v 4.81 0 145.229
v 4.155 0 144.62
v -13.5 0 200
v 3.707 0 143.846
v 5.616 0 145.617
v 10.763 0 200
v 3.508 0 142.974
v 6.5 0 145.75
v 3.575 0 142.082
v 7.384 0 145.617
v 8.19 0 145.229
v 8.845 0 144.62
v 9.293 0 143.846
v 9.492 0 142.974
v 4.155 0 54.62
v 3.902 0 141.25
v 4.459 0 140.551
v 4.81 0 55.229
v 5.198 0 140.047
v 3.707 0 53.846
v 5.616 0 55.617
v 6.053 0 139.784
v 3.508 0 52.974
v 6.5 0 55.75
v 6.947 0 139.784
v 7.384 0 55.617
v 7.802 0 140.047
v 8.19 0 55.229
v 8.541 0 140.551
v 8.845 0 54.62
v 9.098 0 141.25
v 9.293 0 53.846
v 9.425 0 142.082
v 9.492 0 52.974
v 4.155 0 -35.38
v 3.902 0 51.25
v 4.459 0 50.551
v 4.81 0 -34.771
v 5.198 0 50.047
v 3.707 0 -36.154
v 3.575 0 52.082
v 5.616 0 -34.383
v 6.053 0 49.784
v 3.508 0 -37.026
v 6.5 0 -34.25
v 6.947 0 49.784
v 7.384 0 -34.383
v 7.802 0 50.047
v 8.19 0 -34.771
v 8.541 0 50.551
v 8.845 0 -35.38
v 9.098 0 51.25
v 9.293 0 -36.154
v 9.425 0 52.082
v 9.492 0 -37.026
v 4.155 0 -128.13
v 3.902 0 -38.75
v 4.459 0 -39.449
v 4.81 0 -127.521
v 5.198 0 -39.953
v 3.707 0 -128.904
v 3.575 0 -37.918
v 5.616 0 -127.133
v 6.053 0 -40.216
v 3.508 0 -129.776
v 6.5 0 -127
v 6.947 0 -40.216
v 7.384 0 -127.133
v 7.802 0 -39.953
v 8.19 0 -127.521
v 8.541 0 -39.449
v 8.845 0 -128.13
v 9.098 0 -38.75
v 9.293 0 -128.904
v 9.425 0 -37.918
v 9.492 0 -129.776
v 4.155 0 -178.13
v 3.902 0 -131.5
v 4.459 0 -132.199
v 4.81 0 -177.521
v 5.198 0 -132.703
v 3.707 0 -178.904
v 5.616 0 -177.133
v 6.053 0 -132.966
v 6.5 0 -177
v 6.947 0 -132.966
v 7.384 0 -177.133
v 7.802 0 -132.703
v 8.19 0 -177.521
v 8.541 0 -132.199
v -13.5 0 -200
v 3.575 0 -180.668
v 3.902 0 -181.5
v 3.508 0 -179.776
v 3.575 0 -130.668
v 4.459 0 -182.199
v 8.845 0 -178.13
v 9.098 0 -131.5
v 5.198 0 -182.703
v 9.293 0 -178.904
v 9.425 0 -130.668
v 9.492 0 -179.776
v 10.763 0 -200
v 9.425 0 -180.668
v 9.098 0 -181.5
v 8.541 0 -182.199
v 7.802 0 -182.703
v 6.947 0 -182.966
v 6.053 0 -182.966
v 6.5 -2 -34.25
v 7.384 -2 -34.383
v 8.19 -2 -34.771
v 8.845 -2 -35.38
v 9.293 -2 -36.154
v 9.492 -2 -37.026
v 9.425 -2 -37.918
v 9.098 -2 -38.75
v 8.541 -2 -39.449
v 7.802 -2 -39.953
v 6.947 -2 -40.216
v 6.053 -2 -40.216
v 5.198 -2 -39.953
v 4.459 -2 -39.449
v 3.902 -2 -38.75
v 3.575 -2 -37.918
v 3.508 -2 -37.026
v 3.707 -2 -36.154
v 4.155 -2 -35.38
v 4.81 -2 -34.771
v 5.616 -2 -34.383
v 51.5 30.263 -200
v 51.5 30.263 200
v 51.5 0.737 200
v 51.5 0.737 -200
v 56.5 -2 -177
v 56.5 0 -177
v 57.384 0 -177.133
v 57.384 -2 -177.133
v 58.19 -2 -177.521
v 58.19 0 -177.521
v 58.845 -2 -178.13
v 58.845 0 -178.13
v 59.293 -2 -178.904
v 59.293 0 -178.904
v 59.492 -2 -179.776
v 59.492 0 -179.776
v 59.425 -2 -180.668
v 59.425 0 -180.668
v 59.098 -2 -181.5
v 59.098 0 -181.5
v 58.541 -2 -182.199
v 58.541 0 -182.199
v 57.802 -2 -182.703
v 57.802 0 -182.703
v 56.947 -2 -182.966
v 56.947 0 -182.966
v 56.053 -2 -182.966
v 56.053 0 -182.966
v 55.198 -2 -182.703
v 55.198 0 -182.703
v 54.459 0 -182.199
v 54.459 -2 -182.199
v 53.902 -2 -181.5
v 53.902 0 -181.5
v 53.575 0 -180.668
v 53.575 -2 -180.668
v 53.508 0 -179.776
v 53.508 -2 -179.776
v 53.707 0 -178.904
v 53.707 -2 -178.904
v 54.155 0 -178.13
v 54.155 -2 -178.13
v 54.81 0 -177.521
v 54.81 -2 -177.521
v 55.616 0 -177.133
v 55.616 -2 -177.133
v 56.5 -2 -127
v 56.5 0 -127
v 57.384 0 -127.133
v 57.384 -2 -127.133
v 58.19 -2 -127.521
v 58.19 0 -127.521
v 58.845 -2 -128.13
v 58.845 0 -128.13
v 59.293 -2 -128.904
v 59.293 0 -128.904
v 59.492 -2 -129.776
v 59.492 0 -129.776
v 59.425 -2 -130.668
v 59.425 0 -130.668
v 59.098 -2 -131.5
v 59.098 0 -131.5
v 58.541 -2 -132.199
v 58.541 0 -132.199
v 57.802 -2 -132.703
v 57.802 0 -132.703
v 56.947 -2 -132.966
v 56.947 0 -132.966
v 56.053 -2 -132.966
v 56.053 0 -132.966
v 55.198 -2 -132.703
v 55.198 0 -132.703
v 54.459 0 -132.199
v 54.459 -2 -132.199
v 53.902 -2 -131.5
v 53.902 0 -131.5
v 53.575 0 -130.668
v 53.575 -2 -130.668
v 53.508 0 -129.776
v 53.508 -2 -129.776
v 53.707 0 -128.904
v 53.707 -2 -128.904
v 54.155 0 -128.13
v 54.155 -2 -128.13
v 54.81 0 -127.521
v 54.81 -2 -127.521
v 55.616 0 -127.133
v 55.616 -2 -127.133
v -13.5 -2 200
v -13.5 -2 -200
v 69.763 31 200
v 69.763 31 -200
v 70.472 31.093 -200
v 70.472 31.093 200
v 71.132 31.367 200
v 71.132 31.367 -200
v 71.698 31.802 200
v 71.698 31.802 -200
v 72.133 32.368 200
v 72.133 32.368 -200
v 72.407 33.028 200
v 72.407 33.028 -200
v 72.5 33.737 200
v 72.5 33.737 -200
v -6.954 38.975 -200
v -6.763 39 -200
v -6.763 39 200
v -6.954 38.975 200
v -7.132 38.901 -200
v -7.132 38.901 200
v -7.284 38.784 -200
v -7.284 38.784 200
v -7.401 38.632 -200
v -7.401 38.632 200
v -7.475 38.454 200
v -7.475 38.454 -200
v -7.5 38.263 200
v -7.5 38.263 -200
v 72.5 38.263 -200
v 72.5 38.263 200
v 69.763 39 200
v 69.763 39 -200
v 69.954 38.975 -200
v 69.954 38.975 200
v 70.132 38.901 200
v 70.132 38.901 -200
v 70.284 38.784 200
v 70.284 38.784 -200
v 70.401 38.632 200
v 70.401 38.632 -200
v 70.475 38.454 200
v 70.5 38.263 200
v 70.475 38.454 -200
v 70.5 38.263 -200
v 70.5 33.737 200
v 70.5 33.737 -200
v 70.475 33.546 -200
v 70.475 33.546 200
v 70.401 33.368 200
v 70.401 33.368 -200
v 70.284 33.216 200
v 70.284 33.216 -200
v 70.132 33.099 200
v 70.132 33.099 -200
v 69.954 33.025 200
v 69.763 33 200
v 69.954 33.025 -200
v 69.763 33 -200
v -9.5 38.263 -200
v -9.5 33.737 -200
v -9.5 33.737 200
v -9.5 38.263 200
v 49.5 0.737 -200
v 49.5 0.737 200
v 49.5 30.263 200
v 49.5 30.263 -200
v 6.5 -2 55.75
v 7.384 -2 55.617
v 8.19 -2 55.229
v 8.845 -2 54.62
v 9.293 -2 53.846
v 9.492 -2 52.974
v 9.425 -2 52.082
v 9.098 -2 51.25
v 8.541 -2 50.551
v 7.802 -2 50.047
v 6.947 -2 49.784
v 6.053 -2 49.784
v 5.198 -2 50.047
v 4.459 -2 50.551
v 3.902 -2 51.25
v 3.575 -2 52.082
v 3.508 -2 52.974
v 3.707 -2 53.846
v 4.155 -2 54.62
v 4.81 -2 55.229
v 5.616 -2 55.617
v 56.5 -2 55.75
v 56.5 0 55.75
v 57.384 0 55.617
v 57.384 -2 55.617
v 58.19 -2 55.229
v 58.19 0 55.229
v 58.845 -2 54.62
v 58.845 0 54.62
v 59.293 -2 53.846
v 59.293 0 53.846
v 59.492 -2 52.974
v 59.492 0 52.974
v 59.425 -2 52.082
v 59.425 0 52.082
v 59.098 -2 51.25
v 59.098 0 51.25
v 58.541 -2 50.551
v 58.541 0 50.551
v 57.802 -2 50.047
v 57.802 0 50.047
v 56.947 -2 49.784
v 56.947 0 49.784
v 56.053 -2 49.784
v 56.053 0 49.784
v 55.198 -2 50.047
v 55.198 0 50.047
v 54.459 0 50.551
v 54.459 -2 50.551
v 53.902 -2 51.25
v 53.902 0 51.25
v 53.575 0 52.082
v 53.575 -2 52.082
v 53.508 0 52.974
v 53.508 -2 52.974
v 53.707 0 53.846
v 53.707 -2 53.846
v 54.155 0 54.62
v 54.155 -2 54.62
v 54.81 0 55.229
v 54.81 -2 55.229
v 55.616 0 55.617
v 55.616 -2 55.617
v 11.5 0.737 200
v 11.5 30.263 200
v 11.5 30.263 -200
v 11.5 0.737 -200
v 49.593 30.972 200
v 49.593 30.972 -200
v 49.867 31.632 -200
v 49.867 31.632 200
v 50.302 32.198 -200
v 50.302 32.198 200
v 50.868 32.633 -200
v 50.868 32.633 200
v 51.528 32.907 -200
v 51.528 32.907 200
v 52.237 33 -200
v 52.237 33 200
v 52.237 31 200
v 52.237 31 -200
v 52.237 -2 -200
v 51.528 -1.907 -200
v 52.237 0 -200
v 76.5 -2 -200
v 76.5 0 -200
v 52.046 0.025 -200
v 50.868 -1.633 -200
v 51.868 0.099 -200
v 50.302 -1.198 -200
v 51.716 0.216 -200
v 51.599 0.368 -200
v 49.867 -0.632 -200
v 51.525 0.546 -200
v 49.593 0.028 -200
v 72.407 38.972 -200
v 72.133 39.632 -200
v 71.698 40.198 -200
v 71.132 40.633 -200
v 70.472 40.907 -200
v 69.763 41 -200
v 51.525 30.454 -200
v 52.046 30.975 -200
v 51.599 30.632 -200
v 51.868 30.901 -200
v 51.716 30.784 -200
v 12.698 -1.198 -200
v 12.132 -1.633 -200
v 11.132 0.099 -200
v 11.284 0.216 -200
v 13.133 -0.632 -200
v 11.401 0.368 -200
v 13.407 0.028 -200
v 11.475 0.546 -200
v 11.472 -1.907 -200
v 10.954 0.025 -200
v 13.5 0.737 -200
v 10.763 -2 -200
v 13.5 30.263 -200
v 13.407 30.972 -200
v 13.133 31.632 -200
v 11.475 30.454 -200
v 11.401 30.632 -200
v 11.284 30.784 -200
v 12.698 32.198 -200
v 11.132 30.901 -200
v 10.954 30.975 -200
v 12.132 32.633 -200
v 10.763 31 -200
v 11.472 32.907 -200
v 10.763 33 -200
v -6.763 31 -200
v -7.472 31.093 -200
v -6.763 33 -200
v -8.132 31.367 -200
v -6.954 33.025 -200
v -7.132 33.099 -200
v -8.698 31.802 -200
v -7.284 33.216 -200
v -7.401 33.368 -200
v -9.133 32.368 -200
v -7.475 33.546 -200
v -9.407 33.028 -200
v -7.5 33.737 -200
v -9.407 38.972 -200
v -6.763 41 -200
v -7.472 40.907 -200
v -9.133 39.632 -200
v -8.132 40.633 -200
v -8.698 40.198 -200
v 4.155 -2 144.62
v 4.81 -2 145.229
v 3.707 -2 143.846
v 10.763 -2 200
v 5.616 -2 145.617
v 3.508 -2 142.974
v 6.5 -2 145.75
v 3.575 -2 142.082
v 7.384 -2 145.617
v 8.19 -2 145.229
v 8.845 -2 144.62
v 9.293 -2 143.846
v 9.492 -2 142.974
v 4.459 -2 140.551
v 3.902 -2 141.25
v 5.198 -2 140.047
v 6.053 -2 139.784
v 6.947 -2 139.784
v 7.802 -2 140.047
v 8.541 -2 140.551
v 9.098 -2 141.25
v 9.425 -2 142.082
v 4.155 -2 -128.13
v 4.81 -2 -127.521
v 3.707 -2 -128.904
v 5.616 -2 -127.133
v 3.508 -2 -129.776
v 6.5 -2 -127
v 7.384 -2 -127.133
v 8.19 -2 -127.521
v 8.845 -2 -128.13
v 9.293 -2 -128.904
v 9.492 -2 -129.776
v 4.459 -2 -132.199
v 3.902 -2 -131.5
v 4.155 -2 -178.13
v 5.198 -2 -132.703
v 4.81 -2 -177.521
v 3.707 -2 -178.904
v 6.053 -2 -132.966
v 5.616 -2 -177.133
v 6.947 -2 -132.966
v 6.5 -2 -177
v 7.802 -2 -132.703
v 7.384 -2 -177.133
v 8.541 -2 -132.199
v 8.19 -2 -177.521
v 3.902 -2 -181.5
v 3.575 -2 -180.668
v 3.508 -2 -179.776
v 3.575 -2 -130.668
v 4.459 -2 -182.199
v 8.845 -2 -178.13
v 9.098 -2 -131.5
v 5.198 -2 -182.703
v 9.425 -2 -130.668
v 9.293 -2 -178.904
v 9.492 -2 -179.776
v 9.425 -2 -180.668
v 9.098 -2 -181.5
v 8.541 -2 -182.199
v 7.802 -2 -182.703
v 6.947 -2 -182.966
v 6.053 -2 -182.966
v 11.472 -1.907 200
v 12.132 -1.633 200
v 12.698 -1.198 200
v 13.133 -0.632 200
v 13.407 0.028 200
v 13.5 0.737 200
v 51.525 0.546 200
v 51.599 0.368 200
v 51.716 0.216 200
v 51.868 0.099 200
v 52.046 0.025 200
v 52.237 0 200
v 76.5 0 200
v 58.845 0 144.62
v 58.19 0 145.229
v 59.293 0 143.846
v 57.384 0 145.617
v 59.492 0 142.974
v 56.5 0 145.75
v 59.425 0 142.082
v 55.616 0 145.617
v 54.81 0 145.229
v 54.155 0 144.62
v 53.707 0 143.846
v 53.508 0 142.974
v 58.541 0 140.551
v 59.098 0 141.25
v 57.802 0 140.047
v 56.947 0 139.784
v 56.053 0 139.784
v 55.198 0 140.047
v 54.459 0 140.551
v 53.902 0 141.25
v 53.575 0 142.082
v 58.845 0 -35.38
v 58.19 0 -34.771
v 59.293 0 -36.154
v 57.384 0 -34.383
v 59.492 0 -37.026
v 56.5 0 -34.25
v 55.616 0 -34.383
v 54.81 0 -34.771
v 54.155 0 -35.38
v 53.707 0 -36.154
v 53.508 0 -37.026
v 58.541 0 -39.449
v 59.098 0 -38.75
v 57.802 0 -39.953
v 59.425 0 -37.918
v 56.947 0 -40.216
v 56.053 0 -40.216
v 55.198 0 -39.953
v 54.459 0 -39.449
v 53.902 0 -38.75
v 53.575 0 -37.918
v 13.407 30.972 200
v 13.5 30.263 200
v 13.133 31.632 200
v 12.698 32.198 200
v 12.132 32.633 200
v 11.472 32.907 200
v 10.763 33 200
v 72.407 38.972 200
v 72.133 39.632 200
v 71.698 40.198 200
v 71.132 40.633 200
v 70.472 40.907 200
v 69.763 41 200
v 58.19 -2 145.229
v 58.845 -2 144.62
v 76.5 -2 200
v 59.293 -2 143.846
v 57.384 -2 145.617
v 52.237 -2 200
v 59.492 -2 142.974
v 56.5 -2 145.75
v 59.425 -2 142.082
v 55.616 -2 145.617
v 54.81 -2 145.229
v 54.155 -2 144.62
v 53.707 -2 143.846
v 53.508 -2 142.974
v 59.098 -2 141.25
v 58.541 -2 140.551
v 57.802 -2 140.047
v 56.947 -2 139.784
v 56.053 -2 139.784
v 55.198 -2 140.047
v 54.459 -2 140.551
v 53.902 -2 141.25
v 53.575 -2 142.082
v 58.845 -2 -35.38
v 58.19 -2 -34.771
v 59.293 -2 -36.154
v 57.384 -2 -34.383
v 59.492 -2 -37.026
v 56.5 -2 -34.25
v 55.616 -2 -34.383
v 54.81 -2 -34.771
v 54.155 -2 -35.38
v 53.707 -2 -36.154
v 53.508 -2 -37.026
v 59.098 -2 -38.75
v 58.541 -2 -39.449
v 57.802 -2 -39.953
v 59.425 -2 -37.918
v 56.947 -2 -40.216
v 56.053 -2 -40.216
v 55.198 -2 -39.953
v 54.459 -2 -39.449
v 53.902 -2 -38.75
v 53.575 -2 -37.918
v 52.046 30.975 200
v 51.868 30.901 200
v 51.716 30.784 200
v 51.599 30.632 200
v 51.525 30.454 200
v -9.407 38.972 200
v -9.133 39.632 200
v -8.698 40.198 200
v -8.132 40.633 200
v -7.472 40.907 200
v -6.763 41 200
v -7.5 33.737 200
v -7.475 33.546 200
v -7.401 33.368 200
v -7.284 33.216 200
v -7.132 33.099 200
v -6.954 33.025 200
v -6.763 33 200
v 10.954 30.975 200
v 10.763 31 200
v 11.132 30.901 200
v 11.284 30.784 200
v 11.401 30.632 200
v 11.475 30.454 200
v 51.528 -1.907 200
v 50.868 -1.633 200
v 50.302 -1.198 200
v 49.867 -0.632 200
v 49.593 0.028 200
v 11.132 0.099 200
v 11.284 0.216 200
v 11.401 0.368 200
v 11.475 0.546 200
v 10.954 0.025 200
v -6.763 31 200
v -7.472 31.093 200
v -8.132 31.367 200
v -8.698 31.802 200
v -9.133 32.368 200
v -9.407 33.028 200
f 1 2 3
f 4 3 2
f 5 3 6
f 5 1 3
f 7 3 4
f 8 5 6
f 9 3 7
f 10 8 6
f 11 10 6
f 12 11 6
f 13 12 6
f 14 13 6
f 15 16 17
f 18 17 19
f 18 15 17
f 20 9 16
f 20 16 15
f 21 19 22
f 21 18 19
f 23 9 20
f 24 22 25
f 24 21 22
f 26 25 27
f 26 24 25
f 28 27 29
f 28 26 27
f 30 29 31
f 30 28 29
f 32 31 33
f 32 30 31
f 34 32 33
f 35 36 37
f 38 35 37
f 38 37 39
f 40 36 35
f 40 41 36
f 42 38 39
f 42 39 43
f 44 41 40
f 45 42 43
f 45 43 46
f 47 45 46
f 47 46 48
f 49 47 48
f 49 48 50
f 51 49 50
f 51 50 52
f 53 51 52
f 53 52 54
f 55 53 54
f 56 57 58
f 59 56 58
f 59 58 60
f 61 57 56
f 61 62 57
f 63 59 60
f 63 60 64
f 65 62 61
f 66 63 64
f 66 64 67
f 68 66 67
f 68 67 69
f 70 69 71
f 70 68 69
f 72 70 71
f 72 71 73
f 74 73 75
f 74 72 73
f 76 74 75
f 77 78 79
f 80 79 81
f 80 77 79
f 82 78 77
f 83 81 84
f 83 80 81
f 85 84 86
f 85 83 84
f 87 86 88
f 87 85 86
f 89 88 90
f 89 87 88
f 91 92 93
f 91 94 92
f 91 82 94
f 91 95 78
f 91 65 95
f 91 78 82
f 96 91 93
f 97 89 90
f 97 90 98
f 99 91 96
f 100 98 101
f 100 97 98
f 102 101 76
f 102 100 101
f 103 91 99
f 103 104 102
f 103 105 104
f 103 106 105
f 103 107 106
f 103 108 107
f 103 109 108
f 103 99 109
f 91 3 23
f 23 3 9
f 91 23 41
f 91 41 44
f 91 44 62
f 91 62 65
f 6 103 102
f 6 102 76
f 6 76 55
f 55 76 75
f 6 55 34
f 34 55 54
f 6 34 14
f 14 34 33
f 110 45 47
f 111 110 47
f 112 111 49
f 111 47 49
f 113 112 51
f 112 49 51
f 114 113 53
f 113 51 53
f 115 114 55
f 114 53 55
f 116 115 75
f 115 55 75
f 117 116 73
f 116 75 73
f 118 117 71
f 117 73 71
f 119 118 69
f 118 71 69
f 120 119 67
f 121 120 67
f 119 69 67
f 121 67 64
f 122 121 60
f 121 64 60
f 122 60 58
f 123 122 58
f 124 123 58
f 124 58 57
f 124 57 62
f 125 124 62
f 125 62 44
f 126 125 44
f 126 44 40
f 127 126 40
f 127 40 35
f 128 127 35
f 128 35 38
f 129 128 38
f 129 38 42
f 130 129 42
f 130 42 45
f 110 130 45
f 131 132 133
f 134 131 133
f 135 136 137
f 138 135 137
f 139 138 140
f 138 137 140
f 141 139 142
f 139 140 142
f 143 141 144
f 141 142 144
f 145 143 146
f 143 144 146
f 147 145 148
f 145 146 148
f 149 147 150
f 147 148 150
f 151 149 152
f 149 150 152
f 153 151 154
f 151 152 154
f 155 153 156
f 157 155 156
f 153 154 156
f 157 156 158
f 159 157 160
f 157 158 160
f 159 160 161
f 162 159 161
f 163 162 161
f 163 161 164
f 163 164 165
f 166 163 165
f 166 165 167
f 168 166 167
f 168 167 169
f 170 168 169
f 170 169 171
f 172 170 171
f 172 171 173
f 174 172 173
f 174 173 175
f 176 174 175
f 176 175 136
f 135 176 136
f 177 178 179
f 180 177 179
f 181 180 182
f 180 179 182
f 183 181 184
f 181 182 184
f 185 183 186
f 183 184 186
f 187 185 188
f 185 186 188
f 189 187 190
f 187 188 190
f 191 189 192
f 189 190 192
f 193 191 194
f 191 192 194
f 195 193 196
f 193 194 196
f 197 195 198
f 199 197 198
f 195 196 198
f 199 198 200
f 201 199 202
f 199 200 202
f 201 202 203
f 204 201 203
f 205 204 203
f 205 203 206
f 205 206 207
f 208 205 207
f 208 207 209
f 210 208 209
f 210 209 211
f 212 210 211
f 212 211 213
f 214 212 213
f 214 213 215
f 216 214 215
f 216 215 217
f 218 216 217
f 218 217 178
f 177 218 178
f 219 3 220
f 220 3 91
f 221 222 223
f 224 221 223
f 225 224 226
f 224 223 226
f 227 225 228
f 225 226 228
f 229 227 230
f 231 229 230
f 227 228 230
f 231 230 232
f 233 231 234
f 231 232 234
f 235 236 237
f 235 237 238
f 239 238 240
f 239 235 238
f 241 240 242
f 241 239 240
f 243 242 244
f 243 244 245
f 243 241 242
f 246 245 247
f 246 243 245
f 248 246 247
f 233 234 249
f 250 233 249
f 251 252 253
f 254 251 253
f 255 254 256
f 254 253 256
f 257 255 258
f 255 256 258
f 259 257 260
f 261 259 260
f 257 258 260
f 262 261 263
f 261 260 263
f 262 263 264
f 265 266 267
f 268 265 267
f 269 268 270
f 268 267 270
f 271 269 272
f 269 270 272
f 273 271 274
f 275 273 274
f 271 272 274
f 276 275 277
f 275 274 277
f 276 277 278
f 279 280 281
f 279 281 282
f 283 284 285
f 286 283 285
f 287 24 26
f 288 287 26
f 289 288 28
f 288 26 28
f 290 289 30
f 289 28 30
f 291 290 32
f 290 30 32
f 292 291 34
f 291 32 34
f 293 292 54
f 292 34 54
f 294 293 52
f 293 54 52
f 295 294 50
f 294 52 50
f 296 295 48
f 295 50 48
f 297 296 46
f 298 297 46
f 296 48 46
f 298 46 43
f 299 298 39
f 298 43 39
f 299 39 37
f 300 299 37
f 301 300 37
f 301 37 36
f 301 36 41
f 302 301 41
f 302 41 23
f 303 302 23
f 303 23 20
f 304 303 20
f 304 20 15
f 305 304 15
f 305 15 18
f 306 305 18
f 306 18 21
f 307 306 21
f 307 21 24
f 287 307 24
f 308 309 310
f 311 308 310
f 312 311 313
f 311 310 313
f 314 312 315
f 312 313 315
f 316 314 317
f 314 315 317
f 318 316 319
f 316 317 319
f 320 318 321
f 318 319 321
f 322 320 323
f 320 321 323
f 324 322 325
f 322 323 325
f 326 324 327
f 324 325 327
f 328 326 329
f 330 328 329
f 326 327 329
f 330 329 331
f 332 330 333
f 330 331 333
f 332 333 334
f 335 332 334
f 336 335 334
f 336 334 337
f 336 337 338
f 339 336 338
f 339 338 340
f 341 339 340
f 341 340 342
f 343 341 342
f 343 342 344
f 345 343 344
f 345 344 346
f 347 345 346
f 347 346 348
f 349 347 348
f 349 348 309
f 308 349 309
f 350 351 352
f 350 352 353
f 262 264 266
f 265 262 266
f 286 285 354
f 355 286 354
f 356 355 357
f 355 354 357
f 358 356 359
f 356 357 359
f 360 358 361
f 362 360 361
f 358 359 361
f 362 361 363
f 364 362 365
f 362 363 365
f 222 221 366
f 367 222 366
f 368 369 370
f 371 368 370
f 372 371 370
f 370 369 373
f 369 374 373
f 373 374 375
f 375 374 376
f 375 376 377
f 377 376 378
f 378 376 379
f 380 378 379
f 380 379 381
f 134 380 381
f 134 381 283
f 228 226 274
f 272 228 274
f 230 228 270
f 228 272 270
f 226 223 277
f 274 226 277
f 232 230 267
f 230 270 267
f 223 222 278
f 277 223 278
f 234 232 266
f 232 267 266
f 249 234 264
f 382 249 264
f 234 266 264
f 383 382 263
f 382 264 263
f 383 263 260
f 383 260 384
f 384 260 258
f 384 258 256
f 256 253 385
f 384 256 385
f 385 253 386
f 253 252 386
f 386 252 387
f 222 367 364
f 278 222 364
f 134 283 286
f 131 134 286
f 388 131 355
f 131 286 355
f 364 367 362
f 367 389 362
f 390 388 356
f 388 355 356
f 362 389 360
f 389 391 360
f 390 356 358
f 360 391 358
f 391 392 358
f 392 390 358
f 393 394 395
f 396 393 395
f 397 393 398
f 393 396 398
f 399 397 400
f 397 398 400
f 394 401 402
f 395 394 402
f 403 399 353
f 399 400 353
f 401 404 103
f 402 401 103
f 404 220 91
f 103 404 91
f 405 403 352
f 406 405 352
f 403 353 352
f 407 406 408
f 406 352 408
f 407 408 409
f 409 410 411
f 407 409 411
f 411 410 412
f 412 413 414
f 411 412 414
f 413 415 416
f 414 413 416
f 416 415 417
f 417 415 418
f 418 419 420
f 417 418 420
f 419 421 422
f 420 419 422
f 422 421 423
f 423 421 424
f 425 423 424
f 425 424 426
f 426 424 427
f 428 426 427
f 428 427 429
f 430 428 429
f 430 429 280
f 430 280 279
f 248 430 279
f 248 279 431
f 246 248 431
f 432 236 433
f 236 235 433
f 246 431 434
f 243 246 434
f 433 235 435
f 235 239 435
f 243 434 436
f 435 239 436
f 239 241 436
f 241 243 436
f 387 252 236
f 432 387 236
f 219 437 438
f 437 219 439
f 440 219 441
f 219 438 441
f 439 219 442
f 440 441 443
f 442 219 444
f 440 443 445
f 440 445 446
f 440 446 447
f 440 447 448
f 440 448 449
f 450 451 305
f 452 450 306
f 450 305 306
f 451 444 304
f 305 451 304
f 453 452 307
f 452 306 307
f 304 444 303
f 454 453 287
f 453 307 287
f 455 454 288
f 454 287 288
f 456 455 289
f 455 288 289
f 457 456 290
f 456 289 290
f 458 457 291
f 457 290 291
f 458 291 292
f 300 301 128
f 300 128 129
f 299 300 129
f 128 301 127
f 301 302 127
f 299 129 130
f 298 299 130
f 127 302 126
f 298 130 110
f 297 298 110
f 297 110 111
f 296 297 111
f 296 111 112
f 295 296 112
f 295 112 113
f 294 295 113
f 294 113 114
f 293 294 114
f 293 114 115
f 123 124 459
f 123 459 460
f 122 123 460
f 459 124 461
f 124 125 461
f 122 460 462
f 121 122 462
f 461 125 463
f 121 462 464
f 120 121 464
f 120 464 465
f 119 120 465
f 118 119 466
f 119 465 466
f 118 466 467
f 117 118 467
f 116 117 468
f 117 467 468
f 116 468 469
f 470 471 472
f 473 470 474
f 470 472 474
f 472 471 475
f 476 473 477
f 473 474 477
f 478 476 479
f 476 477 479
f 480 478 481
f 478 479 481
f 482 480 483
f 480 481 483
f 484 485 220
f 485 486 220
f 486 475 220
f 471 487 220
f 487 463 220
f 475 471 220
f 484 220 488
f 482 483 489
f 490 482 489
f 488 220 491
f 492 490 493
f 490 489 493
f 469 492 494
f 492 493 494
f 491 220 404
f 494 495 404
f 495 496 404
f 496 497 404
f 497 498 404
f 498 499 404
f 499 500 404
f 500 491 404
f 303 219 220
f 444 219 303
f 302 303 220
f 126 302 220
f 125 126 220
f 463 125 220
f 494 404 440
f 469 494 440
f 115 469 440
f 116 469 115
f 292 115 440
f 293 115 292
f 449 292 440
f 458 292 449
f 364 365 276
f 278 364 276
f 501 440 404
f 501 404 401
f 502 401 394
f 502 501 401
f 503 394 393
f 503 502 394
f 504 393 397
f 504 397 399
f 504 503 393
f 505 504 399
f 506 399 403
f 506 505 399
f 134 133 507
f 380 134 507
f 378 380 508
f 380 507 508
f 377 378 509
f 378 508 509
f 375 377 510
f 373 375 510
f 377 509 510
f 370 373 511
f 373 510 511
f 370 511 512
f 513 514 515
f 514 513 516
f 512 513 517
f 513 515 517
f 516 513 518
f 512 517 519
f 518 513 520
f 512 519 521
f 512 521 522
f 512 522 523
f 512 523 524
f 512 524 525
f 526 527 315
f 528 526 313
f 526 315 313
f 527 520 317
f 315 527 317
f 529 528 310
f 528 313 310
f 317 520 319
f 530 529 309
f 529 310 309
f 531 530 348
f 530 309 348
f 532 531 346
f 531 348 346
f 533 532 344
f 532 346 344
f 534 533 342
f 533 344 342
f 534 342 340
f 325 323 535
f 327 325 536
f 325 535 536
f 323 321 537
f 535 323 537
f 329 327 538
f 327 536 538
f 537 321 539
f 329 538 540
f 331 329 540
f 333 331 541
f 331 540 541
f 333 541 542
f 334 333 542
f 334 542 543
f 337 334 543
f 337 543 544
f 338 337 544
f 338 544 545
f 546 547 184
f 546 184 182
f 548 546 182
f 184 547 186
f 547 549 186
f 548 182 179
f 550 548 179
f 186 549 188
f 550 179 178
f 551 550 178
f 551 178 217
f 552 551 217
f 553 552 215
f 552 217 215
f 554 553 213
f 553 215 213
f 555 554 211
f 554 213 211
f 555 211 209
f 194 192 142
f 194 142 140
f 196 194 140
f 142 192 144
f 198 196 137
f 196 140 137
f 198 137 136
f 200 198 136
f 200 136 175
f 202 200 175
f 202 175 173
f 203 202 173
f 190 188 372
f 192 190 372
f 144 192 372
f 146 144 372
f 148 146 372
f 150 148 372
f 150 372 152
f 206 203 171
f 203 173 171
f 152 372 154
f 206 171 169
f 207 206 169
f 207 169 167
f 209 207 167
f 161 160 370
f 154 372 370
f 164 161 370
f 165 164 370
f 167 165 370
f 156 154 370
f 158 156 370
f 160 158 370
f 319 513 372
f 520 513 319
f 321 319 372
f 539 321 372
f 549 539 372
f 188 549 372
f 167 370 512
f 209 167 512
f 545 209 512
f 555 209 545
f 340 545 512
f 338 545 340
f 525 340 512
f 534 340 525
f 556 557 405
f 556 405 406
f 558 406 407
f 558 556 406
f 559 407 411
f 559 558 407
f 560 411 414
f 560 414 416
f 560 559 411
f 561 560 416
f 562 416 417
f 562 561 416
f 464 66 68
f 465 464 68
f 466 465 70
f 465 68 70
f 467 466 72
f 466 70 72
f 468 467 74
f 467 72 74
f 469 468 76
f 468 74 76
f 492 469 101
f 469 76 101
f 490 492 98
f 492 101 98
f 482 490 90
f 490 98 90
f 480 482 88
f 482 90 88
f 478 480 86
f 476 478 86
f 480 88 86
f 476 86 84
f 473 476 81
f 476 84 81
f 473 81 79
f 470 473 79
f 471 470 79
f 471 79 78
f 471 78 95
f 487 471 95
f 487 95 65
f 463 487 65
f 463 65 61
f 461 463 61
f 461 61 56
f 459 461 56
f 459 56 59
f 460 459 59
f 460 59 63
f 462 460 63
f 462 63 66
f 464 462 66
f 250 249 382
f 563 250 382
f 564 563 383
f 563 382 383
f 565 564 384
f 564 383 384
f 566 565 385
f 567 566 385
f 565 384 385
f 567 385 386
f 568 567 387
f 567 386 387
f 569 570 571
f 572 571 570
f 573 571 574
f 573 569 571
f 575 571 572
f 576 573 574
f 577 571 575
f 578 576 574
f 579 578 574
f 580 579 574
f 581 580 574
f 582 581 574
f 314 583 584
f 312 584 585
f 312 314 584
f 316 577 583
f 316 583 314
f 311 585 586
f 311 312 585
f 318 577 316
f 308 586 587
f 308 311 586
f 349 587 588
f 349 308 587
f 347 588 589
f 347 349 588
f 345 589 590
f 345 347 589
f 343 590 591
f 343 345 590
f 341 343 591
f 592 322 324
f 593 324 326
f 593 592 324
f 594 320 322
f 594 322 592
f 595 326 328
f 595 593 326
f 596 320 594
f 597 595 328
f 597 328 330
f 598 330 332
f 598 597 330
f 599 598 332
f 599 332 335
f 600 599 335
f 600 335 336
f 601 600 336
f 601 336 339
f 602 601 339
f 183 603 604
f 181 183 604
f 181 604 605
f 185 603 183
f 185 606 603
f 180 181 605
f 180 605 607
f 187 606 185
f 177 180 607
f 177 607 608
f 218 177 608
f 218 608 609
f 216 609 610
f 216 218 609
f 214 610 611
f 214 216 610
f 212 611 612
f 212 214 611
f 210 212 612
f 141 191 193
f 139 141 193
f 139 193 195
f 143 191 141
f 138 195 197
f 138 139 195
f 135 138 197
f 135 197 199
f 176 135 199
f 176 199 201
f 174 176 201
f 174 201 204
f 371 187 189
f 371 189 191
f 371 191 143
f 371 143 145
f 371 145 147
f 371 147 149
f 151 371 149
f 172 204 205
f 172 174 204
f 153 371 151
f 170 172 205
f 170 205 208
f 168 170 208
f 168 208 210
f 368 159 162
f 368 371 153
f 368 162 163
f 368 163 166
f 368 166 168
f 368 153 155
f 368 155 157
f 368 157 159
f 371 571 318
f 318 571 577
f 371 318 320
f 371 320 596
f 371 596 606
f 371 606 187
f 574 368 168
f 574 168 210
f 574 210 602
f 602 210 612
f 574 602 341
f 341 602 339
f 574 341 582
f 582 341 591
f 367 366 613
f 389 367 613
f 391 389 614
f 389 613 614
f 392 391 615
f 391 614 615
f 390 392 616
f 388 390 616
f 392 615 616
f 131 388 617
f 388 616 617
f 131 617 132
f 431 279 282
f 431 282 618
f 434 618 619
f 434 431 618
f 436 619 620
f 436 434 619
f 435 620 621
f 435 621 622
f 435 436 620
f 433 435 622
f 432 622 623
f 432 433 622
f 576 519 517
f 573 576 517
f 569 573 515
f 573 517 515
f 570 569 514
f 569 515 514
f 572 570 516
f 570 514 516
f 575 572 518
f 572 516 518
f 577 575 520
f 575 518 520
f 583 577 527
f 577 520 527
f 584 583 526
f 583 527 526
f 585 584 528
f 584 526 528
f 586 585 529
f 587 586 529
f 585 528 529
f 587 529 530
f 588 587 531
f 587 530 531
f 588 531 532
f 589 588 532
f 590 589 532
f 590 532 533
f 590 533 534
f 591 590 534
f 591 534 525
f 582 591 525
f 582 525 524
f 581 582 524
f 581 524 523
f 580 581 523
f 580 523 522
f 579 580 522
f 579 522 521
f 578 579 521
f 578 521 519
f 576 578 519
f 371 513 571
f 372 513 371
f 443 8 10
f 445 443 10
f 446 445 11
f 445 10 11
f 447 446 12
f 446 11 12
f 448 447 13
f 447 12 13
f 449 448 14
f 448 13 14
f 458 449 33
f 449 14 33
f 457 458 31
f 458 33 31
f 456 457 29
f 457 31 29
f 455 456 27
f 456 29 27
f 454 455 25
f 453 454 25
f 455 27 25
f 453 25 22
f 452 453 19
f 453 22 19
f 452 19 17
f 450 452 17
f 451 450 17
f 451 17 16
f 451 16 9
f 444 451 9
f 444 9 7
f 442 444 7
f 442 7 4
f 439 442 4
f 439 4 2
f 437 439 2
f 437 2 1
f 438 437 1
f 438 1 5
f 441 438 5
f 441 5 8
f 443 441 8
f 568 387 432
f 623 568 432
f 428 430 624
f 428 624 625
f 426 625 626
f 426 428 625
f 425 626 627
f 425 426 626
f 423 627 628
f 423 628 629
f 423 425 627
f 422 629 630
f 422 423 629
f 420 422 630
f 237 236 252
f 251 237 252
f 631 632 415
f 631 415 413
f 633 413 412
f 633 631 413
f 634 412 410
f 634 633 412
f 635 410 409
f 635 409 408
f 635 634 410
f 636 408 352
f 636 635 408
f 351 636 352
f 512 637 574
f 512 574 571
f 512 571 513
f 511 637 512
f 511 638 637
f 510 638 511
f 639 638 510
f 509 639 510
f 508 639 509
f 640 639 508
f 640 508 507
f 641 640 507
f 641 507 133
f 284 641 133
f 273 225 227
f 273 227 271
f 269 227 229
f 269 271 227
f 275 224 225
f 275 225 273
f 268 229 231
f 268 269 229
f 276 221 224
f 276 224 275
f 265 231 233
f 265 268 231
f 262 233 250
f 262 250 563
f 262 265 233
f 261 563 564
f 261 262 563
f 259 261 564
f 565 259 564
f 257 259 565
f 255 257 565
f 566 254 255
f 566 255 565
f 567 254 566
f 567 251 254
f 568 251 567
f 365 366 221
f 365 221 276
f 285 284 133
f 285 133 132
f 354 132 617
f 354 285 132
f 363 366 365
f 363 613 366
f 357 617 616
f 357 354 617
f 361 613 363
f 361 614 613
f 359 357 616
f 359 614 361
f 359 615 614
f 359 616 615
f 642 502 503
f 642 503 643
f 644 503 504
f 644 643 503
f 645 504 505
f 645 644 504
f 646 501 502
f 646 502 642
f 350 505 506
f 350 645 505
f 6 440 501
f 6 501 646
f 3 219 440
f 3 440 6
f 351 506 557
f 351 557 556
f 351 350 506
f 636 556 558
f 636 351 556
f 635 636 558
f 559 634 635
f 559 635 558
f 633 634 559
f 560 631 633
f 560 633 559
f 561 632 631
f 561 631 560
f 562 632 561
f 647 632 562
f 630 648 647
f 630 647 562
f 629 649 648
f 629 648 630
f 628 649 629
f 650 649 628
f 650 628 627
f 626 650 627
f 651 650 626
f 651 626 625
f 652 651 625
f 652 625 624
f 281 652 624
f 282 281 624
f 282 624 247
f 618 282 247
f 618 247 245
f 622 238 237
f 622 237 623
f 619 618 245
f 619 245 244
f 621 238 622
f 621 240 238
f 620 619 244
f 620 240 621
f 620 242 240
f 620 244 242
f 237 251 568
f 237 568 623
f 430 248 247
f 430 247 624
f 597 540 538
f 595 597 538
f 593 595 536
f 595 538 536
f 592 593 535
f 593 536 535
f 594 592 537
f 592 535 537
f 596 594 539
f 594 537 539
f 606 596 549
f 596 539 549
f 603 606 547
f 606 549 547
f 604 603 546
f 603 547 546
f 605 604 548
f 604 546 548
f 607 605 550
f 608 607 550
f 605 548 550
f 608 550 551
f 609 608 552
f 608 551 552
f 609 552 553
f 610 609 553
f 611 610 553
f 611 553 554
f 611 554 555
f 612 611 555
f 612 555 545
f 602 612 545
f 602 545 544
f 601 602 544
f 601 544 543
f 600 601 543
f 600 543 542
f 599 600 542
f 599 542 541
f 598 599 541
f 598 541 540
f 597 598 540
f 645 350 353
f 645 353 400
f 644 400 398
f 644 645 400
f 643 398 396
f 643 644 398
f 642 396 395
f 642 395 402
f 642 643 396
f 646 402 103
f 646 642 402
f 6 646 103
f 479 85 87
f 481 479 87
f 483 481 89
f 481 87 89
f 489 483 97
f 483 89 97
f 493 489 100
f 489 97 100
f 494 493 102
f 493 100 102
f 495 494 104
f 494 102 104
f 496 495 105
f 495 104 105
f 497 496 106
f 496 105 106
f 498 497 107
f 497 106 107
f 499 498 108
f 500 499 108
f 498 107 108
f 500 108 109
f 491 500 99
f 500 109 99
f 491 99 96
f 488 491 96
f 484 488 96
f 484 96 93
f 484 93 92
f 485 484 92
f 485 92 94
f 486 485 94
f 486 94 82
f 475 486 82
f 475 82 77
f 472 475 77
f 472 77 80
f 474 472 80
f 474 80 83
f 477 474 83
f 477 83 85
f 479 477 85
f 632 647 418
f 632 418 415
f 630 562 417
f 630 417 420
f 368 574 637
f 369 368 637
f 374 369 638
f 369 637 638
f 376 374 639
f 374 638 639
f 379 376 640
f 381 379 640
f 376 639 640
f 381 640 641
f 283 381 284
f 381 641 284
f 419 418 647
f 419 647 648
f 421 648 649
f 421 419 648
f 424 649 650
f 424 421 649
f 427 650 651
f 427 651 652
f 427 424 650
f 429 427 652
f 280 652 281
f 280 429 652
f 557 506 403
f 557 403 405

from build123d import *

# Parameters (mm, degrees)
SKETCH1_W                    = 27
SKETCH1_H                    = 400
BASE_FLANGE1_DEPTH           = 2
EDGE_FLANGE1_STRIP_W         = 9.4732
EDGE_FLANGE1_STRIP_H         = 2
EDGE_FLANGE1_STRIP_CUT_DEPTH = 400
EDGE_FLANGE1_DEPTH           = 400
EDGE_FLANGE2_STRIP_W         = 9.4732
EDGE_FLANGE2_STRIP_H         = 2
EDGE_FLANGE2_STRIP_CUT_DEPTH = 400
EDGE_FLANGE2_DEPTH           = 400
EDGE_FLANGE3_STRIP_W         = 9.4732
EDGE_FLANGE3_STRIP_H         = 2
EDGE_FLANGE3_STRIP_CUT_DEPTH = 400
EDGE_FLANGE3_DEPTH           = 400
EDGE_FLANGE4_STRIP_W         = 9.4732
EDGE_FLANGE4_STRIP_H         = 2
EDGE_FLANGE4_STRIP_CUT_DEPTH = 400
EDGE_FLANGE4_DEPTH           = 400
SKETCH18_R                   = 3
CUT_EXTRUDE1_DEPTH           = 219.021214564
SKETCH19_R                   = 3
CUT_EXTRUDE2_DEPTH           = 219.021214564


# Sheet-metal steps are written as plain solids
with BuildPart() as part:
    # Sketch1 → Base-Flange1 (new body)
    with BuildSketch(Plane(origin=(0, 0, 0), x_dir=(1, 0, 0), z_dir=(0, 1, 0))):
        Rectangle(SKETCH1_W, SKETCH1_H)
    extrude(amount=-BASE_FLANGE1_DEPTH)

    # Edge-Flange1 strip (across the edge) → Edge-Flange1 strip cut (cut)
    with BuildSketch(Plane(origin=(13.5, 0, 200), x_dir=(-1, 0, 0), z_dir=(0, 0, -1))):
        with Locations((-2, -1)):
            Rectangle(EDGE_FLANGE1_STRIP_W, EDGE_FLANGE1_STRIP_H)
    extrude(amount=EDGE_FLANGE1_STRIP_CUT_DEPTH, mode=Mode.SUBTRACT)

    # Edge-Flange1 section (across the edge) → Edge-Flange1 (add)
    with BuildSketch(Plane(origin=(13.5, 0, 200), x_dir=(-1, 0, 0), z_dir=(0, 0, -1))):
        with BuildLine():
            Line((0, 0.7366), (0, 33))
            Line((0, 33), (2, 33))
            Line((2, 33), (2, 0.7366))
            ThreePointArc((2, 0.7366), (2.215745145, 0.215745145), (2.7366, 0))
            Line((2.7366, 0), (2.7366, -2))
            ThreePointArc((2.7366, -2), (0.801531583, -1.198468417), (0, 0.7366))
        make_face()
    extrude(amount=EDGE_FLANGE1_DEPTH)

    # Edge-Flange2 strip (across the edge) → Edge-Flange2 strip cut (cut)
    with BuildSketch(Plane(origin=(11.5, 33, 200), x_dir=(0, -1, 0), z_dir=(0, 0, -1))):
        with Locations((-2, -1)):
            Rectangle(EDGE_FLANGE2_STRIP_W, EDGE_FLANGE2_STRIP_H)
    extrude(amount=EDGE_FLANGE2_STRIP_CUT_DEPTH, mode=Mode.SUBTRACT)

    # Edge-Flange2 section (across the edge) → Edge-Flange2 (add)
    with BuildSketch(Plane(origin=(11.5, 33, 200), x_dir=(0, -1, 0), z_dir=(0, 0, -1))):
        with BuildLine():
            Line((0, 0.7366), (0, 21))
            Line((0, 21), (2, 21))
            Line((2, 21), (2, 0.7366))
            ThreePointArc((2, 0.7366), (2.215745145, 0.215745145), (2.7366, 0))
            Line((2.7366, 0), (2.7366, -2))
            ThreePointArc((2.7366, -2), (0.801531583, -1.198468417), (0, 0.7366))
        make_face()
    extrude(amount=EDGE_FLANGE2_DEPTH)

    # Edge-Flange3 strip (across the edge) → Edge-Flange3 strip cut (cut)
    with BuildSketch(Plane(origin=(-9.5, 33, -200), x_dir=(1, 0, 0), z_dir=(0, 0, 1))):
        with Locations((-2, -1)):
            Rectangle(EDGE_FLANGE3_STRIP_W, EDGE_FLANGE3_STRIP_H)
    extrude(amount=EDGE_FLANGE3_STRIP_CUT_DEPTH, mode=Mode.SUBTRACT)

    # Edge-Flange3 section (across the edge) → Edge-Flange3 (add)
    with BuildSketch(Plane(origin=(-9.5, 33, -200), x_dir=(1, 0, 0), z_dir=(0, 0, 1))):
        with BuildLine():
            Line((0, 0.7366), (0, 8))
            Line((0, 8), (2, 8))
            Line((2, 8), (2, 0.7366))
            ThreePointArc((2, 0.7366), (2.215745145, 0.215745145), (2.7366, 0))
            Line((2.7366, 0), (2.7366, -2))
            ThreePointArc((2.7366, -2), (0.801531583, -1.198468417), (0, 0.7366))
        make_face()
    extrude(amount=EDGE_FLANGE3_DEPTH)

    # Edge-Flange4 strip (across the edge) → Edge-Flange4 strip cut (cut)
    with BuildSketch(Plane(origin=(-7.5, 41, -200), x_dir=(0, -1, 0), z_dir=(0, 0, 1))):
        with Locations((-2, -1)):
            Rectangle(EDGE_FLANGE4_STRIP_W, EDGE_FLANGE4_STRIP_H)
    extrude(amount=EDGE_FLANGE4_STRIP_CUT_DEPTH, mode=Mode.SUBTRACT)

    # Edge-Flange4 section (across the edge) → Edge-Flange4 (add)
    with BuildSketch(Plane(origin=(-7.5, 41, -200), x_dir=(0, -1, 0), z_dir=(0, 0, 1))):
        with BuildLine():
            Line((0, 0.7366), (0, 39))
            Line((0, 39), (2, 39))
            Line((2, 39), (2, 0.7366))
            ThreePointArc((2, 0.7366), (2.215745145, 0.215745145), (2.7366, 0))
            Line((2.7366, 0), (2.7366, -2))
            ThreePointArc((2.7366, -2), (0.801531583, -1.198468417), (0, 0.7366))
        make_face()
    extrude(amount=EDGE_FLANGE4_DEPTH)

    # Mirror1: part across plane


with BuildPart() as part_1:
    add(part.part)
    add(part.part.mirror(Plane(origin=(31.5, 41, -200), x_dir=(0, 0, 1), z_dir=(-1, 0, 0))))

    # Sketch18 → Cut-Extrude1 (cut, through all)
    with BuildSketch(Plane(origin=(0, 0, 0), x_dir=(1, 0, 0), z_dir=(0, 1, 0))):
        with Locations(Location((6.5, 180, 0), (0, 0, 270))):
            Circle(SKETCH18_R)
        with Locations(Location((56.5, 130, 0), (0, 0, 270))):
            Circle(SKETCH18_R)
        with Locations(Location((56.5, 180, 0), (0, 0, 270))):
            Circle(SKETCH18_R)
        with Locations(Location((6.5, 130, 0), (0, 0, 270))):
            Circle(SKETCH18_R)
    extrude(amount=-CUT_EXTRUDE1_DEPTH, mode=Mode.SUBTRACT)

    # Sketch19 → Cut-Extrude2 (cut, through all)
    with BuildSketch(Plane(origin=(0, 0, 0), x_dir=(1, 0, 0), z_dir=(0, 1, 0))):
        with Locations(Location((56.5, -142.75, 0), (0, 0, 270))):
            Circle(SKETCH19_R)
        with Locations(Location((56.5, -52.75, 0), (0, 0, 270))):
            Circle(SKETCH19_R)
        with Locations(Location((56.5, 37.25, 0), (0, 0, 270))):
            Circle(SKETCH19_R)
        with Locations(Location((6.5, 37.25, 0), (0, 0, 270))):
            Circle(SKETCH19_R)
        with Locations(Location((6.5, -52.75, 0), (0, 0, 270))):
            Circle(SKETCH19_R)
        with Locations(Location((6.5, -142.75, 0), (0, 0, 270))):
            Circle(SKETCH19_R)
    extrude(amount=-CUT_EXTRUDE2_DEPTH, mode=Mode.SUBTRACT)


solid = part_1.part
